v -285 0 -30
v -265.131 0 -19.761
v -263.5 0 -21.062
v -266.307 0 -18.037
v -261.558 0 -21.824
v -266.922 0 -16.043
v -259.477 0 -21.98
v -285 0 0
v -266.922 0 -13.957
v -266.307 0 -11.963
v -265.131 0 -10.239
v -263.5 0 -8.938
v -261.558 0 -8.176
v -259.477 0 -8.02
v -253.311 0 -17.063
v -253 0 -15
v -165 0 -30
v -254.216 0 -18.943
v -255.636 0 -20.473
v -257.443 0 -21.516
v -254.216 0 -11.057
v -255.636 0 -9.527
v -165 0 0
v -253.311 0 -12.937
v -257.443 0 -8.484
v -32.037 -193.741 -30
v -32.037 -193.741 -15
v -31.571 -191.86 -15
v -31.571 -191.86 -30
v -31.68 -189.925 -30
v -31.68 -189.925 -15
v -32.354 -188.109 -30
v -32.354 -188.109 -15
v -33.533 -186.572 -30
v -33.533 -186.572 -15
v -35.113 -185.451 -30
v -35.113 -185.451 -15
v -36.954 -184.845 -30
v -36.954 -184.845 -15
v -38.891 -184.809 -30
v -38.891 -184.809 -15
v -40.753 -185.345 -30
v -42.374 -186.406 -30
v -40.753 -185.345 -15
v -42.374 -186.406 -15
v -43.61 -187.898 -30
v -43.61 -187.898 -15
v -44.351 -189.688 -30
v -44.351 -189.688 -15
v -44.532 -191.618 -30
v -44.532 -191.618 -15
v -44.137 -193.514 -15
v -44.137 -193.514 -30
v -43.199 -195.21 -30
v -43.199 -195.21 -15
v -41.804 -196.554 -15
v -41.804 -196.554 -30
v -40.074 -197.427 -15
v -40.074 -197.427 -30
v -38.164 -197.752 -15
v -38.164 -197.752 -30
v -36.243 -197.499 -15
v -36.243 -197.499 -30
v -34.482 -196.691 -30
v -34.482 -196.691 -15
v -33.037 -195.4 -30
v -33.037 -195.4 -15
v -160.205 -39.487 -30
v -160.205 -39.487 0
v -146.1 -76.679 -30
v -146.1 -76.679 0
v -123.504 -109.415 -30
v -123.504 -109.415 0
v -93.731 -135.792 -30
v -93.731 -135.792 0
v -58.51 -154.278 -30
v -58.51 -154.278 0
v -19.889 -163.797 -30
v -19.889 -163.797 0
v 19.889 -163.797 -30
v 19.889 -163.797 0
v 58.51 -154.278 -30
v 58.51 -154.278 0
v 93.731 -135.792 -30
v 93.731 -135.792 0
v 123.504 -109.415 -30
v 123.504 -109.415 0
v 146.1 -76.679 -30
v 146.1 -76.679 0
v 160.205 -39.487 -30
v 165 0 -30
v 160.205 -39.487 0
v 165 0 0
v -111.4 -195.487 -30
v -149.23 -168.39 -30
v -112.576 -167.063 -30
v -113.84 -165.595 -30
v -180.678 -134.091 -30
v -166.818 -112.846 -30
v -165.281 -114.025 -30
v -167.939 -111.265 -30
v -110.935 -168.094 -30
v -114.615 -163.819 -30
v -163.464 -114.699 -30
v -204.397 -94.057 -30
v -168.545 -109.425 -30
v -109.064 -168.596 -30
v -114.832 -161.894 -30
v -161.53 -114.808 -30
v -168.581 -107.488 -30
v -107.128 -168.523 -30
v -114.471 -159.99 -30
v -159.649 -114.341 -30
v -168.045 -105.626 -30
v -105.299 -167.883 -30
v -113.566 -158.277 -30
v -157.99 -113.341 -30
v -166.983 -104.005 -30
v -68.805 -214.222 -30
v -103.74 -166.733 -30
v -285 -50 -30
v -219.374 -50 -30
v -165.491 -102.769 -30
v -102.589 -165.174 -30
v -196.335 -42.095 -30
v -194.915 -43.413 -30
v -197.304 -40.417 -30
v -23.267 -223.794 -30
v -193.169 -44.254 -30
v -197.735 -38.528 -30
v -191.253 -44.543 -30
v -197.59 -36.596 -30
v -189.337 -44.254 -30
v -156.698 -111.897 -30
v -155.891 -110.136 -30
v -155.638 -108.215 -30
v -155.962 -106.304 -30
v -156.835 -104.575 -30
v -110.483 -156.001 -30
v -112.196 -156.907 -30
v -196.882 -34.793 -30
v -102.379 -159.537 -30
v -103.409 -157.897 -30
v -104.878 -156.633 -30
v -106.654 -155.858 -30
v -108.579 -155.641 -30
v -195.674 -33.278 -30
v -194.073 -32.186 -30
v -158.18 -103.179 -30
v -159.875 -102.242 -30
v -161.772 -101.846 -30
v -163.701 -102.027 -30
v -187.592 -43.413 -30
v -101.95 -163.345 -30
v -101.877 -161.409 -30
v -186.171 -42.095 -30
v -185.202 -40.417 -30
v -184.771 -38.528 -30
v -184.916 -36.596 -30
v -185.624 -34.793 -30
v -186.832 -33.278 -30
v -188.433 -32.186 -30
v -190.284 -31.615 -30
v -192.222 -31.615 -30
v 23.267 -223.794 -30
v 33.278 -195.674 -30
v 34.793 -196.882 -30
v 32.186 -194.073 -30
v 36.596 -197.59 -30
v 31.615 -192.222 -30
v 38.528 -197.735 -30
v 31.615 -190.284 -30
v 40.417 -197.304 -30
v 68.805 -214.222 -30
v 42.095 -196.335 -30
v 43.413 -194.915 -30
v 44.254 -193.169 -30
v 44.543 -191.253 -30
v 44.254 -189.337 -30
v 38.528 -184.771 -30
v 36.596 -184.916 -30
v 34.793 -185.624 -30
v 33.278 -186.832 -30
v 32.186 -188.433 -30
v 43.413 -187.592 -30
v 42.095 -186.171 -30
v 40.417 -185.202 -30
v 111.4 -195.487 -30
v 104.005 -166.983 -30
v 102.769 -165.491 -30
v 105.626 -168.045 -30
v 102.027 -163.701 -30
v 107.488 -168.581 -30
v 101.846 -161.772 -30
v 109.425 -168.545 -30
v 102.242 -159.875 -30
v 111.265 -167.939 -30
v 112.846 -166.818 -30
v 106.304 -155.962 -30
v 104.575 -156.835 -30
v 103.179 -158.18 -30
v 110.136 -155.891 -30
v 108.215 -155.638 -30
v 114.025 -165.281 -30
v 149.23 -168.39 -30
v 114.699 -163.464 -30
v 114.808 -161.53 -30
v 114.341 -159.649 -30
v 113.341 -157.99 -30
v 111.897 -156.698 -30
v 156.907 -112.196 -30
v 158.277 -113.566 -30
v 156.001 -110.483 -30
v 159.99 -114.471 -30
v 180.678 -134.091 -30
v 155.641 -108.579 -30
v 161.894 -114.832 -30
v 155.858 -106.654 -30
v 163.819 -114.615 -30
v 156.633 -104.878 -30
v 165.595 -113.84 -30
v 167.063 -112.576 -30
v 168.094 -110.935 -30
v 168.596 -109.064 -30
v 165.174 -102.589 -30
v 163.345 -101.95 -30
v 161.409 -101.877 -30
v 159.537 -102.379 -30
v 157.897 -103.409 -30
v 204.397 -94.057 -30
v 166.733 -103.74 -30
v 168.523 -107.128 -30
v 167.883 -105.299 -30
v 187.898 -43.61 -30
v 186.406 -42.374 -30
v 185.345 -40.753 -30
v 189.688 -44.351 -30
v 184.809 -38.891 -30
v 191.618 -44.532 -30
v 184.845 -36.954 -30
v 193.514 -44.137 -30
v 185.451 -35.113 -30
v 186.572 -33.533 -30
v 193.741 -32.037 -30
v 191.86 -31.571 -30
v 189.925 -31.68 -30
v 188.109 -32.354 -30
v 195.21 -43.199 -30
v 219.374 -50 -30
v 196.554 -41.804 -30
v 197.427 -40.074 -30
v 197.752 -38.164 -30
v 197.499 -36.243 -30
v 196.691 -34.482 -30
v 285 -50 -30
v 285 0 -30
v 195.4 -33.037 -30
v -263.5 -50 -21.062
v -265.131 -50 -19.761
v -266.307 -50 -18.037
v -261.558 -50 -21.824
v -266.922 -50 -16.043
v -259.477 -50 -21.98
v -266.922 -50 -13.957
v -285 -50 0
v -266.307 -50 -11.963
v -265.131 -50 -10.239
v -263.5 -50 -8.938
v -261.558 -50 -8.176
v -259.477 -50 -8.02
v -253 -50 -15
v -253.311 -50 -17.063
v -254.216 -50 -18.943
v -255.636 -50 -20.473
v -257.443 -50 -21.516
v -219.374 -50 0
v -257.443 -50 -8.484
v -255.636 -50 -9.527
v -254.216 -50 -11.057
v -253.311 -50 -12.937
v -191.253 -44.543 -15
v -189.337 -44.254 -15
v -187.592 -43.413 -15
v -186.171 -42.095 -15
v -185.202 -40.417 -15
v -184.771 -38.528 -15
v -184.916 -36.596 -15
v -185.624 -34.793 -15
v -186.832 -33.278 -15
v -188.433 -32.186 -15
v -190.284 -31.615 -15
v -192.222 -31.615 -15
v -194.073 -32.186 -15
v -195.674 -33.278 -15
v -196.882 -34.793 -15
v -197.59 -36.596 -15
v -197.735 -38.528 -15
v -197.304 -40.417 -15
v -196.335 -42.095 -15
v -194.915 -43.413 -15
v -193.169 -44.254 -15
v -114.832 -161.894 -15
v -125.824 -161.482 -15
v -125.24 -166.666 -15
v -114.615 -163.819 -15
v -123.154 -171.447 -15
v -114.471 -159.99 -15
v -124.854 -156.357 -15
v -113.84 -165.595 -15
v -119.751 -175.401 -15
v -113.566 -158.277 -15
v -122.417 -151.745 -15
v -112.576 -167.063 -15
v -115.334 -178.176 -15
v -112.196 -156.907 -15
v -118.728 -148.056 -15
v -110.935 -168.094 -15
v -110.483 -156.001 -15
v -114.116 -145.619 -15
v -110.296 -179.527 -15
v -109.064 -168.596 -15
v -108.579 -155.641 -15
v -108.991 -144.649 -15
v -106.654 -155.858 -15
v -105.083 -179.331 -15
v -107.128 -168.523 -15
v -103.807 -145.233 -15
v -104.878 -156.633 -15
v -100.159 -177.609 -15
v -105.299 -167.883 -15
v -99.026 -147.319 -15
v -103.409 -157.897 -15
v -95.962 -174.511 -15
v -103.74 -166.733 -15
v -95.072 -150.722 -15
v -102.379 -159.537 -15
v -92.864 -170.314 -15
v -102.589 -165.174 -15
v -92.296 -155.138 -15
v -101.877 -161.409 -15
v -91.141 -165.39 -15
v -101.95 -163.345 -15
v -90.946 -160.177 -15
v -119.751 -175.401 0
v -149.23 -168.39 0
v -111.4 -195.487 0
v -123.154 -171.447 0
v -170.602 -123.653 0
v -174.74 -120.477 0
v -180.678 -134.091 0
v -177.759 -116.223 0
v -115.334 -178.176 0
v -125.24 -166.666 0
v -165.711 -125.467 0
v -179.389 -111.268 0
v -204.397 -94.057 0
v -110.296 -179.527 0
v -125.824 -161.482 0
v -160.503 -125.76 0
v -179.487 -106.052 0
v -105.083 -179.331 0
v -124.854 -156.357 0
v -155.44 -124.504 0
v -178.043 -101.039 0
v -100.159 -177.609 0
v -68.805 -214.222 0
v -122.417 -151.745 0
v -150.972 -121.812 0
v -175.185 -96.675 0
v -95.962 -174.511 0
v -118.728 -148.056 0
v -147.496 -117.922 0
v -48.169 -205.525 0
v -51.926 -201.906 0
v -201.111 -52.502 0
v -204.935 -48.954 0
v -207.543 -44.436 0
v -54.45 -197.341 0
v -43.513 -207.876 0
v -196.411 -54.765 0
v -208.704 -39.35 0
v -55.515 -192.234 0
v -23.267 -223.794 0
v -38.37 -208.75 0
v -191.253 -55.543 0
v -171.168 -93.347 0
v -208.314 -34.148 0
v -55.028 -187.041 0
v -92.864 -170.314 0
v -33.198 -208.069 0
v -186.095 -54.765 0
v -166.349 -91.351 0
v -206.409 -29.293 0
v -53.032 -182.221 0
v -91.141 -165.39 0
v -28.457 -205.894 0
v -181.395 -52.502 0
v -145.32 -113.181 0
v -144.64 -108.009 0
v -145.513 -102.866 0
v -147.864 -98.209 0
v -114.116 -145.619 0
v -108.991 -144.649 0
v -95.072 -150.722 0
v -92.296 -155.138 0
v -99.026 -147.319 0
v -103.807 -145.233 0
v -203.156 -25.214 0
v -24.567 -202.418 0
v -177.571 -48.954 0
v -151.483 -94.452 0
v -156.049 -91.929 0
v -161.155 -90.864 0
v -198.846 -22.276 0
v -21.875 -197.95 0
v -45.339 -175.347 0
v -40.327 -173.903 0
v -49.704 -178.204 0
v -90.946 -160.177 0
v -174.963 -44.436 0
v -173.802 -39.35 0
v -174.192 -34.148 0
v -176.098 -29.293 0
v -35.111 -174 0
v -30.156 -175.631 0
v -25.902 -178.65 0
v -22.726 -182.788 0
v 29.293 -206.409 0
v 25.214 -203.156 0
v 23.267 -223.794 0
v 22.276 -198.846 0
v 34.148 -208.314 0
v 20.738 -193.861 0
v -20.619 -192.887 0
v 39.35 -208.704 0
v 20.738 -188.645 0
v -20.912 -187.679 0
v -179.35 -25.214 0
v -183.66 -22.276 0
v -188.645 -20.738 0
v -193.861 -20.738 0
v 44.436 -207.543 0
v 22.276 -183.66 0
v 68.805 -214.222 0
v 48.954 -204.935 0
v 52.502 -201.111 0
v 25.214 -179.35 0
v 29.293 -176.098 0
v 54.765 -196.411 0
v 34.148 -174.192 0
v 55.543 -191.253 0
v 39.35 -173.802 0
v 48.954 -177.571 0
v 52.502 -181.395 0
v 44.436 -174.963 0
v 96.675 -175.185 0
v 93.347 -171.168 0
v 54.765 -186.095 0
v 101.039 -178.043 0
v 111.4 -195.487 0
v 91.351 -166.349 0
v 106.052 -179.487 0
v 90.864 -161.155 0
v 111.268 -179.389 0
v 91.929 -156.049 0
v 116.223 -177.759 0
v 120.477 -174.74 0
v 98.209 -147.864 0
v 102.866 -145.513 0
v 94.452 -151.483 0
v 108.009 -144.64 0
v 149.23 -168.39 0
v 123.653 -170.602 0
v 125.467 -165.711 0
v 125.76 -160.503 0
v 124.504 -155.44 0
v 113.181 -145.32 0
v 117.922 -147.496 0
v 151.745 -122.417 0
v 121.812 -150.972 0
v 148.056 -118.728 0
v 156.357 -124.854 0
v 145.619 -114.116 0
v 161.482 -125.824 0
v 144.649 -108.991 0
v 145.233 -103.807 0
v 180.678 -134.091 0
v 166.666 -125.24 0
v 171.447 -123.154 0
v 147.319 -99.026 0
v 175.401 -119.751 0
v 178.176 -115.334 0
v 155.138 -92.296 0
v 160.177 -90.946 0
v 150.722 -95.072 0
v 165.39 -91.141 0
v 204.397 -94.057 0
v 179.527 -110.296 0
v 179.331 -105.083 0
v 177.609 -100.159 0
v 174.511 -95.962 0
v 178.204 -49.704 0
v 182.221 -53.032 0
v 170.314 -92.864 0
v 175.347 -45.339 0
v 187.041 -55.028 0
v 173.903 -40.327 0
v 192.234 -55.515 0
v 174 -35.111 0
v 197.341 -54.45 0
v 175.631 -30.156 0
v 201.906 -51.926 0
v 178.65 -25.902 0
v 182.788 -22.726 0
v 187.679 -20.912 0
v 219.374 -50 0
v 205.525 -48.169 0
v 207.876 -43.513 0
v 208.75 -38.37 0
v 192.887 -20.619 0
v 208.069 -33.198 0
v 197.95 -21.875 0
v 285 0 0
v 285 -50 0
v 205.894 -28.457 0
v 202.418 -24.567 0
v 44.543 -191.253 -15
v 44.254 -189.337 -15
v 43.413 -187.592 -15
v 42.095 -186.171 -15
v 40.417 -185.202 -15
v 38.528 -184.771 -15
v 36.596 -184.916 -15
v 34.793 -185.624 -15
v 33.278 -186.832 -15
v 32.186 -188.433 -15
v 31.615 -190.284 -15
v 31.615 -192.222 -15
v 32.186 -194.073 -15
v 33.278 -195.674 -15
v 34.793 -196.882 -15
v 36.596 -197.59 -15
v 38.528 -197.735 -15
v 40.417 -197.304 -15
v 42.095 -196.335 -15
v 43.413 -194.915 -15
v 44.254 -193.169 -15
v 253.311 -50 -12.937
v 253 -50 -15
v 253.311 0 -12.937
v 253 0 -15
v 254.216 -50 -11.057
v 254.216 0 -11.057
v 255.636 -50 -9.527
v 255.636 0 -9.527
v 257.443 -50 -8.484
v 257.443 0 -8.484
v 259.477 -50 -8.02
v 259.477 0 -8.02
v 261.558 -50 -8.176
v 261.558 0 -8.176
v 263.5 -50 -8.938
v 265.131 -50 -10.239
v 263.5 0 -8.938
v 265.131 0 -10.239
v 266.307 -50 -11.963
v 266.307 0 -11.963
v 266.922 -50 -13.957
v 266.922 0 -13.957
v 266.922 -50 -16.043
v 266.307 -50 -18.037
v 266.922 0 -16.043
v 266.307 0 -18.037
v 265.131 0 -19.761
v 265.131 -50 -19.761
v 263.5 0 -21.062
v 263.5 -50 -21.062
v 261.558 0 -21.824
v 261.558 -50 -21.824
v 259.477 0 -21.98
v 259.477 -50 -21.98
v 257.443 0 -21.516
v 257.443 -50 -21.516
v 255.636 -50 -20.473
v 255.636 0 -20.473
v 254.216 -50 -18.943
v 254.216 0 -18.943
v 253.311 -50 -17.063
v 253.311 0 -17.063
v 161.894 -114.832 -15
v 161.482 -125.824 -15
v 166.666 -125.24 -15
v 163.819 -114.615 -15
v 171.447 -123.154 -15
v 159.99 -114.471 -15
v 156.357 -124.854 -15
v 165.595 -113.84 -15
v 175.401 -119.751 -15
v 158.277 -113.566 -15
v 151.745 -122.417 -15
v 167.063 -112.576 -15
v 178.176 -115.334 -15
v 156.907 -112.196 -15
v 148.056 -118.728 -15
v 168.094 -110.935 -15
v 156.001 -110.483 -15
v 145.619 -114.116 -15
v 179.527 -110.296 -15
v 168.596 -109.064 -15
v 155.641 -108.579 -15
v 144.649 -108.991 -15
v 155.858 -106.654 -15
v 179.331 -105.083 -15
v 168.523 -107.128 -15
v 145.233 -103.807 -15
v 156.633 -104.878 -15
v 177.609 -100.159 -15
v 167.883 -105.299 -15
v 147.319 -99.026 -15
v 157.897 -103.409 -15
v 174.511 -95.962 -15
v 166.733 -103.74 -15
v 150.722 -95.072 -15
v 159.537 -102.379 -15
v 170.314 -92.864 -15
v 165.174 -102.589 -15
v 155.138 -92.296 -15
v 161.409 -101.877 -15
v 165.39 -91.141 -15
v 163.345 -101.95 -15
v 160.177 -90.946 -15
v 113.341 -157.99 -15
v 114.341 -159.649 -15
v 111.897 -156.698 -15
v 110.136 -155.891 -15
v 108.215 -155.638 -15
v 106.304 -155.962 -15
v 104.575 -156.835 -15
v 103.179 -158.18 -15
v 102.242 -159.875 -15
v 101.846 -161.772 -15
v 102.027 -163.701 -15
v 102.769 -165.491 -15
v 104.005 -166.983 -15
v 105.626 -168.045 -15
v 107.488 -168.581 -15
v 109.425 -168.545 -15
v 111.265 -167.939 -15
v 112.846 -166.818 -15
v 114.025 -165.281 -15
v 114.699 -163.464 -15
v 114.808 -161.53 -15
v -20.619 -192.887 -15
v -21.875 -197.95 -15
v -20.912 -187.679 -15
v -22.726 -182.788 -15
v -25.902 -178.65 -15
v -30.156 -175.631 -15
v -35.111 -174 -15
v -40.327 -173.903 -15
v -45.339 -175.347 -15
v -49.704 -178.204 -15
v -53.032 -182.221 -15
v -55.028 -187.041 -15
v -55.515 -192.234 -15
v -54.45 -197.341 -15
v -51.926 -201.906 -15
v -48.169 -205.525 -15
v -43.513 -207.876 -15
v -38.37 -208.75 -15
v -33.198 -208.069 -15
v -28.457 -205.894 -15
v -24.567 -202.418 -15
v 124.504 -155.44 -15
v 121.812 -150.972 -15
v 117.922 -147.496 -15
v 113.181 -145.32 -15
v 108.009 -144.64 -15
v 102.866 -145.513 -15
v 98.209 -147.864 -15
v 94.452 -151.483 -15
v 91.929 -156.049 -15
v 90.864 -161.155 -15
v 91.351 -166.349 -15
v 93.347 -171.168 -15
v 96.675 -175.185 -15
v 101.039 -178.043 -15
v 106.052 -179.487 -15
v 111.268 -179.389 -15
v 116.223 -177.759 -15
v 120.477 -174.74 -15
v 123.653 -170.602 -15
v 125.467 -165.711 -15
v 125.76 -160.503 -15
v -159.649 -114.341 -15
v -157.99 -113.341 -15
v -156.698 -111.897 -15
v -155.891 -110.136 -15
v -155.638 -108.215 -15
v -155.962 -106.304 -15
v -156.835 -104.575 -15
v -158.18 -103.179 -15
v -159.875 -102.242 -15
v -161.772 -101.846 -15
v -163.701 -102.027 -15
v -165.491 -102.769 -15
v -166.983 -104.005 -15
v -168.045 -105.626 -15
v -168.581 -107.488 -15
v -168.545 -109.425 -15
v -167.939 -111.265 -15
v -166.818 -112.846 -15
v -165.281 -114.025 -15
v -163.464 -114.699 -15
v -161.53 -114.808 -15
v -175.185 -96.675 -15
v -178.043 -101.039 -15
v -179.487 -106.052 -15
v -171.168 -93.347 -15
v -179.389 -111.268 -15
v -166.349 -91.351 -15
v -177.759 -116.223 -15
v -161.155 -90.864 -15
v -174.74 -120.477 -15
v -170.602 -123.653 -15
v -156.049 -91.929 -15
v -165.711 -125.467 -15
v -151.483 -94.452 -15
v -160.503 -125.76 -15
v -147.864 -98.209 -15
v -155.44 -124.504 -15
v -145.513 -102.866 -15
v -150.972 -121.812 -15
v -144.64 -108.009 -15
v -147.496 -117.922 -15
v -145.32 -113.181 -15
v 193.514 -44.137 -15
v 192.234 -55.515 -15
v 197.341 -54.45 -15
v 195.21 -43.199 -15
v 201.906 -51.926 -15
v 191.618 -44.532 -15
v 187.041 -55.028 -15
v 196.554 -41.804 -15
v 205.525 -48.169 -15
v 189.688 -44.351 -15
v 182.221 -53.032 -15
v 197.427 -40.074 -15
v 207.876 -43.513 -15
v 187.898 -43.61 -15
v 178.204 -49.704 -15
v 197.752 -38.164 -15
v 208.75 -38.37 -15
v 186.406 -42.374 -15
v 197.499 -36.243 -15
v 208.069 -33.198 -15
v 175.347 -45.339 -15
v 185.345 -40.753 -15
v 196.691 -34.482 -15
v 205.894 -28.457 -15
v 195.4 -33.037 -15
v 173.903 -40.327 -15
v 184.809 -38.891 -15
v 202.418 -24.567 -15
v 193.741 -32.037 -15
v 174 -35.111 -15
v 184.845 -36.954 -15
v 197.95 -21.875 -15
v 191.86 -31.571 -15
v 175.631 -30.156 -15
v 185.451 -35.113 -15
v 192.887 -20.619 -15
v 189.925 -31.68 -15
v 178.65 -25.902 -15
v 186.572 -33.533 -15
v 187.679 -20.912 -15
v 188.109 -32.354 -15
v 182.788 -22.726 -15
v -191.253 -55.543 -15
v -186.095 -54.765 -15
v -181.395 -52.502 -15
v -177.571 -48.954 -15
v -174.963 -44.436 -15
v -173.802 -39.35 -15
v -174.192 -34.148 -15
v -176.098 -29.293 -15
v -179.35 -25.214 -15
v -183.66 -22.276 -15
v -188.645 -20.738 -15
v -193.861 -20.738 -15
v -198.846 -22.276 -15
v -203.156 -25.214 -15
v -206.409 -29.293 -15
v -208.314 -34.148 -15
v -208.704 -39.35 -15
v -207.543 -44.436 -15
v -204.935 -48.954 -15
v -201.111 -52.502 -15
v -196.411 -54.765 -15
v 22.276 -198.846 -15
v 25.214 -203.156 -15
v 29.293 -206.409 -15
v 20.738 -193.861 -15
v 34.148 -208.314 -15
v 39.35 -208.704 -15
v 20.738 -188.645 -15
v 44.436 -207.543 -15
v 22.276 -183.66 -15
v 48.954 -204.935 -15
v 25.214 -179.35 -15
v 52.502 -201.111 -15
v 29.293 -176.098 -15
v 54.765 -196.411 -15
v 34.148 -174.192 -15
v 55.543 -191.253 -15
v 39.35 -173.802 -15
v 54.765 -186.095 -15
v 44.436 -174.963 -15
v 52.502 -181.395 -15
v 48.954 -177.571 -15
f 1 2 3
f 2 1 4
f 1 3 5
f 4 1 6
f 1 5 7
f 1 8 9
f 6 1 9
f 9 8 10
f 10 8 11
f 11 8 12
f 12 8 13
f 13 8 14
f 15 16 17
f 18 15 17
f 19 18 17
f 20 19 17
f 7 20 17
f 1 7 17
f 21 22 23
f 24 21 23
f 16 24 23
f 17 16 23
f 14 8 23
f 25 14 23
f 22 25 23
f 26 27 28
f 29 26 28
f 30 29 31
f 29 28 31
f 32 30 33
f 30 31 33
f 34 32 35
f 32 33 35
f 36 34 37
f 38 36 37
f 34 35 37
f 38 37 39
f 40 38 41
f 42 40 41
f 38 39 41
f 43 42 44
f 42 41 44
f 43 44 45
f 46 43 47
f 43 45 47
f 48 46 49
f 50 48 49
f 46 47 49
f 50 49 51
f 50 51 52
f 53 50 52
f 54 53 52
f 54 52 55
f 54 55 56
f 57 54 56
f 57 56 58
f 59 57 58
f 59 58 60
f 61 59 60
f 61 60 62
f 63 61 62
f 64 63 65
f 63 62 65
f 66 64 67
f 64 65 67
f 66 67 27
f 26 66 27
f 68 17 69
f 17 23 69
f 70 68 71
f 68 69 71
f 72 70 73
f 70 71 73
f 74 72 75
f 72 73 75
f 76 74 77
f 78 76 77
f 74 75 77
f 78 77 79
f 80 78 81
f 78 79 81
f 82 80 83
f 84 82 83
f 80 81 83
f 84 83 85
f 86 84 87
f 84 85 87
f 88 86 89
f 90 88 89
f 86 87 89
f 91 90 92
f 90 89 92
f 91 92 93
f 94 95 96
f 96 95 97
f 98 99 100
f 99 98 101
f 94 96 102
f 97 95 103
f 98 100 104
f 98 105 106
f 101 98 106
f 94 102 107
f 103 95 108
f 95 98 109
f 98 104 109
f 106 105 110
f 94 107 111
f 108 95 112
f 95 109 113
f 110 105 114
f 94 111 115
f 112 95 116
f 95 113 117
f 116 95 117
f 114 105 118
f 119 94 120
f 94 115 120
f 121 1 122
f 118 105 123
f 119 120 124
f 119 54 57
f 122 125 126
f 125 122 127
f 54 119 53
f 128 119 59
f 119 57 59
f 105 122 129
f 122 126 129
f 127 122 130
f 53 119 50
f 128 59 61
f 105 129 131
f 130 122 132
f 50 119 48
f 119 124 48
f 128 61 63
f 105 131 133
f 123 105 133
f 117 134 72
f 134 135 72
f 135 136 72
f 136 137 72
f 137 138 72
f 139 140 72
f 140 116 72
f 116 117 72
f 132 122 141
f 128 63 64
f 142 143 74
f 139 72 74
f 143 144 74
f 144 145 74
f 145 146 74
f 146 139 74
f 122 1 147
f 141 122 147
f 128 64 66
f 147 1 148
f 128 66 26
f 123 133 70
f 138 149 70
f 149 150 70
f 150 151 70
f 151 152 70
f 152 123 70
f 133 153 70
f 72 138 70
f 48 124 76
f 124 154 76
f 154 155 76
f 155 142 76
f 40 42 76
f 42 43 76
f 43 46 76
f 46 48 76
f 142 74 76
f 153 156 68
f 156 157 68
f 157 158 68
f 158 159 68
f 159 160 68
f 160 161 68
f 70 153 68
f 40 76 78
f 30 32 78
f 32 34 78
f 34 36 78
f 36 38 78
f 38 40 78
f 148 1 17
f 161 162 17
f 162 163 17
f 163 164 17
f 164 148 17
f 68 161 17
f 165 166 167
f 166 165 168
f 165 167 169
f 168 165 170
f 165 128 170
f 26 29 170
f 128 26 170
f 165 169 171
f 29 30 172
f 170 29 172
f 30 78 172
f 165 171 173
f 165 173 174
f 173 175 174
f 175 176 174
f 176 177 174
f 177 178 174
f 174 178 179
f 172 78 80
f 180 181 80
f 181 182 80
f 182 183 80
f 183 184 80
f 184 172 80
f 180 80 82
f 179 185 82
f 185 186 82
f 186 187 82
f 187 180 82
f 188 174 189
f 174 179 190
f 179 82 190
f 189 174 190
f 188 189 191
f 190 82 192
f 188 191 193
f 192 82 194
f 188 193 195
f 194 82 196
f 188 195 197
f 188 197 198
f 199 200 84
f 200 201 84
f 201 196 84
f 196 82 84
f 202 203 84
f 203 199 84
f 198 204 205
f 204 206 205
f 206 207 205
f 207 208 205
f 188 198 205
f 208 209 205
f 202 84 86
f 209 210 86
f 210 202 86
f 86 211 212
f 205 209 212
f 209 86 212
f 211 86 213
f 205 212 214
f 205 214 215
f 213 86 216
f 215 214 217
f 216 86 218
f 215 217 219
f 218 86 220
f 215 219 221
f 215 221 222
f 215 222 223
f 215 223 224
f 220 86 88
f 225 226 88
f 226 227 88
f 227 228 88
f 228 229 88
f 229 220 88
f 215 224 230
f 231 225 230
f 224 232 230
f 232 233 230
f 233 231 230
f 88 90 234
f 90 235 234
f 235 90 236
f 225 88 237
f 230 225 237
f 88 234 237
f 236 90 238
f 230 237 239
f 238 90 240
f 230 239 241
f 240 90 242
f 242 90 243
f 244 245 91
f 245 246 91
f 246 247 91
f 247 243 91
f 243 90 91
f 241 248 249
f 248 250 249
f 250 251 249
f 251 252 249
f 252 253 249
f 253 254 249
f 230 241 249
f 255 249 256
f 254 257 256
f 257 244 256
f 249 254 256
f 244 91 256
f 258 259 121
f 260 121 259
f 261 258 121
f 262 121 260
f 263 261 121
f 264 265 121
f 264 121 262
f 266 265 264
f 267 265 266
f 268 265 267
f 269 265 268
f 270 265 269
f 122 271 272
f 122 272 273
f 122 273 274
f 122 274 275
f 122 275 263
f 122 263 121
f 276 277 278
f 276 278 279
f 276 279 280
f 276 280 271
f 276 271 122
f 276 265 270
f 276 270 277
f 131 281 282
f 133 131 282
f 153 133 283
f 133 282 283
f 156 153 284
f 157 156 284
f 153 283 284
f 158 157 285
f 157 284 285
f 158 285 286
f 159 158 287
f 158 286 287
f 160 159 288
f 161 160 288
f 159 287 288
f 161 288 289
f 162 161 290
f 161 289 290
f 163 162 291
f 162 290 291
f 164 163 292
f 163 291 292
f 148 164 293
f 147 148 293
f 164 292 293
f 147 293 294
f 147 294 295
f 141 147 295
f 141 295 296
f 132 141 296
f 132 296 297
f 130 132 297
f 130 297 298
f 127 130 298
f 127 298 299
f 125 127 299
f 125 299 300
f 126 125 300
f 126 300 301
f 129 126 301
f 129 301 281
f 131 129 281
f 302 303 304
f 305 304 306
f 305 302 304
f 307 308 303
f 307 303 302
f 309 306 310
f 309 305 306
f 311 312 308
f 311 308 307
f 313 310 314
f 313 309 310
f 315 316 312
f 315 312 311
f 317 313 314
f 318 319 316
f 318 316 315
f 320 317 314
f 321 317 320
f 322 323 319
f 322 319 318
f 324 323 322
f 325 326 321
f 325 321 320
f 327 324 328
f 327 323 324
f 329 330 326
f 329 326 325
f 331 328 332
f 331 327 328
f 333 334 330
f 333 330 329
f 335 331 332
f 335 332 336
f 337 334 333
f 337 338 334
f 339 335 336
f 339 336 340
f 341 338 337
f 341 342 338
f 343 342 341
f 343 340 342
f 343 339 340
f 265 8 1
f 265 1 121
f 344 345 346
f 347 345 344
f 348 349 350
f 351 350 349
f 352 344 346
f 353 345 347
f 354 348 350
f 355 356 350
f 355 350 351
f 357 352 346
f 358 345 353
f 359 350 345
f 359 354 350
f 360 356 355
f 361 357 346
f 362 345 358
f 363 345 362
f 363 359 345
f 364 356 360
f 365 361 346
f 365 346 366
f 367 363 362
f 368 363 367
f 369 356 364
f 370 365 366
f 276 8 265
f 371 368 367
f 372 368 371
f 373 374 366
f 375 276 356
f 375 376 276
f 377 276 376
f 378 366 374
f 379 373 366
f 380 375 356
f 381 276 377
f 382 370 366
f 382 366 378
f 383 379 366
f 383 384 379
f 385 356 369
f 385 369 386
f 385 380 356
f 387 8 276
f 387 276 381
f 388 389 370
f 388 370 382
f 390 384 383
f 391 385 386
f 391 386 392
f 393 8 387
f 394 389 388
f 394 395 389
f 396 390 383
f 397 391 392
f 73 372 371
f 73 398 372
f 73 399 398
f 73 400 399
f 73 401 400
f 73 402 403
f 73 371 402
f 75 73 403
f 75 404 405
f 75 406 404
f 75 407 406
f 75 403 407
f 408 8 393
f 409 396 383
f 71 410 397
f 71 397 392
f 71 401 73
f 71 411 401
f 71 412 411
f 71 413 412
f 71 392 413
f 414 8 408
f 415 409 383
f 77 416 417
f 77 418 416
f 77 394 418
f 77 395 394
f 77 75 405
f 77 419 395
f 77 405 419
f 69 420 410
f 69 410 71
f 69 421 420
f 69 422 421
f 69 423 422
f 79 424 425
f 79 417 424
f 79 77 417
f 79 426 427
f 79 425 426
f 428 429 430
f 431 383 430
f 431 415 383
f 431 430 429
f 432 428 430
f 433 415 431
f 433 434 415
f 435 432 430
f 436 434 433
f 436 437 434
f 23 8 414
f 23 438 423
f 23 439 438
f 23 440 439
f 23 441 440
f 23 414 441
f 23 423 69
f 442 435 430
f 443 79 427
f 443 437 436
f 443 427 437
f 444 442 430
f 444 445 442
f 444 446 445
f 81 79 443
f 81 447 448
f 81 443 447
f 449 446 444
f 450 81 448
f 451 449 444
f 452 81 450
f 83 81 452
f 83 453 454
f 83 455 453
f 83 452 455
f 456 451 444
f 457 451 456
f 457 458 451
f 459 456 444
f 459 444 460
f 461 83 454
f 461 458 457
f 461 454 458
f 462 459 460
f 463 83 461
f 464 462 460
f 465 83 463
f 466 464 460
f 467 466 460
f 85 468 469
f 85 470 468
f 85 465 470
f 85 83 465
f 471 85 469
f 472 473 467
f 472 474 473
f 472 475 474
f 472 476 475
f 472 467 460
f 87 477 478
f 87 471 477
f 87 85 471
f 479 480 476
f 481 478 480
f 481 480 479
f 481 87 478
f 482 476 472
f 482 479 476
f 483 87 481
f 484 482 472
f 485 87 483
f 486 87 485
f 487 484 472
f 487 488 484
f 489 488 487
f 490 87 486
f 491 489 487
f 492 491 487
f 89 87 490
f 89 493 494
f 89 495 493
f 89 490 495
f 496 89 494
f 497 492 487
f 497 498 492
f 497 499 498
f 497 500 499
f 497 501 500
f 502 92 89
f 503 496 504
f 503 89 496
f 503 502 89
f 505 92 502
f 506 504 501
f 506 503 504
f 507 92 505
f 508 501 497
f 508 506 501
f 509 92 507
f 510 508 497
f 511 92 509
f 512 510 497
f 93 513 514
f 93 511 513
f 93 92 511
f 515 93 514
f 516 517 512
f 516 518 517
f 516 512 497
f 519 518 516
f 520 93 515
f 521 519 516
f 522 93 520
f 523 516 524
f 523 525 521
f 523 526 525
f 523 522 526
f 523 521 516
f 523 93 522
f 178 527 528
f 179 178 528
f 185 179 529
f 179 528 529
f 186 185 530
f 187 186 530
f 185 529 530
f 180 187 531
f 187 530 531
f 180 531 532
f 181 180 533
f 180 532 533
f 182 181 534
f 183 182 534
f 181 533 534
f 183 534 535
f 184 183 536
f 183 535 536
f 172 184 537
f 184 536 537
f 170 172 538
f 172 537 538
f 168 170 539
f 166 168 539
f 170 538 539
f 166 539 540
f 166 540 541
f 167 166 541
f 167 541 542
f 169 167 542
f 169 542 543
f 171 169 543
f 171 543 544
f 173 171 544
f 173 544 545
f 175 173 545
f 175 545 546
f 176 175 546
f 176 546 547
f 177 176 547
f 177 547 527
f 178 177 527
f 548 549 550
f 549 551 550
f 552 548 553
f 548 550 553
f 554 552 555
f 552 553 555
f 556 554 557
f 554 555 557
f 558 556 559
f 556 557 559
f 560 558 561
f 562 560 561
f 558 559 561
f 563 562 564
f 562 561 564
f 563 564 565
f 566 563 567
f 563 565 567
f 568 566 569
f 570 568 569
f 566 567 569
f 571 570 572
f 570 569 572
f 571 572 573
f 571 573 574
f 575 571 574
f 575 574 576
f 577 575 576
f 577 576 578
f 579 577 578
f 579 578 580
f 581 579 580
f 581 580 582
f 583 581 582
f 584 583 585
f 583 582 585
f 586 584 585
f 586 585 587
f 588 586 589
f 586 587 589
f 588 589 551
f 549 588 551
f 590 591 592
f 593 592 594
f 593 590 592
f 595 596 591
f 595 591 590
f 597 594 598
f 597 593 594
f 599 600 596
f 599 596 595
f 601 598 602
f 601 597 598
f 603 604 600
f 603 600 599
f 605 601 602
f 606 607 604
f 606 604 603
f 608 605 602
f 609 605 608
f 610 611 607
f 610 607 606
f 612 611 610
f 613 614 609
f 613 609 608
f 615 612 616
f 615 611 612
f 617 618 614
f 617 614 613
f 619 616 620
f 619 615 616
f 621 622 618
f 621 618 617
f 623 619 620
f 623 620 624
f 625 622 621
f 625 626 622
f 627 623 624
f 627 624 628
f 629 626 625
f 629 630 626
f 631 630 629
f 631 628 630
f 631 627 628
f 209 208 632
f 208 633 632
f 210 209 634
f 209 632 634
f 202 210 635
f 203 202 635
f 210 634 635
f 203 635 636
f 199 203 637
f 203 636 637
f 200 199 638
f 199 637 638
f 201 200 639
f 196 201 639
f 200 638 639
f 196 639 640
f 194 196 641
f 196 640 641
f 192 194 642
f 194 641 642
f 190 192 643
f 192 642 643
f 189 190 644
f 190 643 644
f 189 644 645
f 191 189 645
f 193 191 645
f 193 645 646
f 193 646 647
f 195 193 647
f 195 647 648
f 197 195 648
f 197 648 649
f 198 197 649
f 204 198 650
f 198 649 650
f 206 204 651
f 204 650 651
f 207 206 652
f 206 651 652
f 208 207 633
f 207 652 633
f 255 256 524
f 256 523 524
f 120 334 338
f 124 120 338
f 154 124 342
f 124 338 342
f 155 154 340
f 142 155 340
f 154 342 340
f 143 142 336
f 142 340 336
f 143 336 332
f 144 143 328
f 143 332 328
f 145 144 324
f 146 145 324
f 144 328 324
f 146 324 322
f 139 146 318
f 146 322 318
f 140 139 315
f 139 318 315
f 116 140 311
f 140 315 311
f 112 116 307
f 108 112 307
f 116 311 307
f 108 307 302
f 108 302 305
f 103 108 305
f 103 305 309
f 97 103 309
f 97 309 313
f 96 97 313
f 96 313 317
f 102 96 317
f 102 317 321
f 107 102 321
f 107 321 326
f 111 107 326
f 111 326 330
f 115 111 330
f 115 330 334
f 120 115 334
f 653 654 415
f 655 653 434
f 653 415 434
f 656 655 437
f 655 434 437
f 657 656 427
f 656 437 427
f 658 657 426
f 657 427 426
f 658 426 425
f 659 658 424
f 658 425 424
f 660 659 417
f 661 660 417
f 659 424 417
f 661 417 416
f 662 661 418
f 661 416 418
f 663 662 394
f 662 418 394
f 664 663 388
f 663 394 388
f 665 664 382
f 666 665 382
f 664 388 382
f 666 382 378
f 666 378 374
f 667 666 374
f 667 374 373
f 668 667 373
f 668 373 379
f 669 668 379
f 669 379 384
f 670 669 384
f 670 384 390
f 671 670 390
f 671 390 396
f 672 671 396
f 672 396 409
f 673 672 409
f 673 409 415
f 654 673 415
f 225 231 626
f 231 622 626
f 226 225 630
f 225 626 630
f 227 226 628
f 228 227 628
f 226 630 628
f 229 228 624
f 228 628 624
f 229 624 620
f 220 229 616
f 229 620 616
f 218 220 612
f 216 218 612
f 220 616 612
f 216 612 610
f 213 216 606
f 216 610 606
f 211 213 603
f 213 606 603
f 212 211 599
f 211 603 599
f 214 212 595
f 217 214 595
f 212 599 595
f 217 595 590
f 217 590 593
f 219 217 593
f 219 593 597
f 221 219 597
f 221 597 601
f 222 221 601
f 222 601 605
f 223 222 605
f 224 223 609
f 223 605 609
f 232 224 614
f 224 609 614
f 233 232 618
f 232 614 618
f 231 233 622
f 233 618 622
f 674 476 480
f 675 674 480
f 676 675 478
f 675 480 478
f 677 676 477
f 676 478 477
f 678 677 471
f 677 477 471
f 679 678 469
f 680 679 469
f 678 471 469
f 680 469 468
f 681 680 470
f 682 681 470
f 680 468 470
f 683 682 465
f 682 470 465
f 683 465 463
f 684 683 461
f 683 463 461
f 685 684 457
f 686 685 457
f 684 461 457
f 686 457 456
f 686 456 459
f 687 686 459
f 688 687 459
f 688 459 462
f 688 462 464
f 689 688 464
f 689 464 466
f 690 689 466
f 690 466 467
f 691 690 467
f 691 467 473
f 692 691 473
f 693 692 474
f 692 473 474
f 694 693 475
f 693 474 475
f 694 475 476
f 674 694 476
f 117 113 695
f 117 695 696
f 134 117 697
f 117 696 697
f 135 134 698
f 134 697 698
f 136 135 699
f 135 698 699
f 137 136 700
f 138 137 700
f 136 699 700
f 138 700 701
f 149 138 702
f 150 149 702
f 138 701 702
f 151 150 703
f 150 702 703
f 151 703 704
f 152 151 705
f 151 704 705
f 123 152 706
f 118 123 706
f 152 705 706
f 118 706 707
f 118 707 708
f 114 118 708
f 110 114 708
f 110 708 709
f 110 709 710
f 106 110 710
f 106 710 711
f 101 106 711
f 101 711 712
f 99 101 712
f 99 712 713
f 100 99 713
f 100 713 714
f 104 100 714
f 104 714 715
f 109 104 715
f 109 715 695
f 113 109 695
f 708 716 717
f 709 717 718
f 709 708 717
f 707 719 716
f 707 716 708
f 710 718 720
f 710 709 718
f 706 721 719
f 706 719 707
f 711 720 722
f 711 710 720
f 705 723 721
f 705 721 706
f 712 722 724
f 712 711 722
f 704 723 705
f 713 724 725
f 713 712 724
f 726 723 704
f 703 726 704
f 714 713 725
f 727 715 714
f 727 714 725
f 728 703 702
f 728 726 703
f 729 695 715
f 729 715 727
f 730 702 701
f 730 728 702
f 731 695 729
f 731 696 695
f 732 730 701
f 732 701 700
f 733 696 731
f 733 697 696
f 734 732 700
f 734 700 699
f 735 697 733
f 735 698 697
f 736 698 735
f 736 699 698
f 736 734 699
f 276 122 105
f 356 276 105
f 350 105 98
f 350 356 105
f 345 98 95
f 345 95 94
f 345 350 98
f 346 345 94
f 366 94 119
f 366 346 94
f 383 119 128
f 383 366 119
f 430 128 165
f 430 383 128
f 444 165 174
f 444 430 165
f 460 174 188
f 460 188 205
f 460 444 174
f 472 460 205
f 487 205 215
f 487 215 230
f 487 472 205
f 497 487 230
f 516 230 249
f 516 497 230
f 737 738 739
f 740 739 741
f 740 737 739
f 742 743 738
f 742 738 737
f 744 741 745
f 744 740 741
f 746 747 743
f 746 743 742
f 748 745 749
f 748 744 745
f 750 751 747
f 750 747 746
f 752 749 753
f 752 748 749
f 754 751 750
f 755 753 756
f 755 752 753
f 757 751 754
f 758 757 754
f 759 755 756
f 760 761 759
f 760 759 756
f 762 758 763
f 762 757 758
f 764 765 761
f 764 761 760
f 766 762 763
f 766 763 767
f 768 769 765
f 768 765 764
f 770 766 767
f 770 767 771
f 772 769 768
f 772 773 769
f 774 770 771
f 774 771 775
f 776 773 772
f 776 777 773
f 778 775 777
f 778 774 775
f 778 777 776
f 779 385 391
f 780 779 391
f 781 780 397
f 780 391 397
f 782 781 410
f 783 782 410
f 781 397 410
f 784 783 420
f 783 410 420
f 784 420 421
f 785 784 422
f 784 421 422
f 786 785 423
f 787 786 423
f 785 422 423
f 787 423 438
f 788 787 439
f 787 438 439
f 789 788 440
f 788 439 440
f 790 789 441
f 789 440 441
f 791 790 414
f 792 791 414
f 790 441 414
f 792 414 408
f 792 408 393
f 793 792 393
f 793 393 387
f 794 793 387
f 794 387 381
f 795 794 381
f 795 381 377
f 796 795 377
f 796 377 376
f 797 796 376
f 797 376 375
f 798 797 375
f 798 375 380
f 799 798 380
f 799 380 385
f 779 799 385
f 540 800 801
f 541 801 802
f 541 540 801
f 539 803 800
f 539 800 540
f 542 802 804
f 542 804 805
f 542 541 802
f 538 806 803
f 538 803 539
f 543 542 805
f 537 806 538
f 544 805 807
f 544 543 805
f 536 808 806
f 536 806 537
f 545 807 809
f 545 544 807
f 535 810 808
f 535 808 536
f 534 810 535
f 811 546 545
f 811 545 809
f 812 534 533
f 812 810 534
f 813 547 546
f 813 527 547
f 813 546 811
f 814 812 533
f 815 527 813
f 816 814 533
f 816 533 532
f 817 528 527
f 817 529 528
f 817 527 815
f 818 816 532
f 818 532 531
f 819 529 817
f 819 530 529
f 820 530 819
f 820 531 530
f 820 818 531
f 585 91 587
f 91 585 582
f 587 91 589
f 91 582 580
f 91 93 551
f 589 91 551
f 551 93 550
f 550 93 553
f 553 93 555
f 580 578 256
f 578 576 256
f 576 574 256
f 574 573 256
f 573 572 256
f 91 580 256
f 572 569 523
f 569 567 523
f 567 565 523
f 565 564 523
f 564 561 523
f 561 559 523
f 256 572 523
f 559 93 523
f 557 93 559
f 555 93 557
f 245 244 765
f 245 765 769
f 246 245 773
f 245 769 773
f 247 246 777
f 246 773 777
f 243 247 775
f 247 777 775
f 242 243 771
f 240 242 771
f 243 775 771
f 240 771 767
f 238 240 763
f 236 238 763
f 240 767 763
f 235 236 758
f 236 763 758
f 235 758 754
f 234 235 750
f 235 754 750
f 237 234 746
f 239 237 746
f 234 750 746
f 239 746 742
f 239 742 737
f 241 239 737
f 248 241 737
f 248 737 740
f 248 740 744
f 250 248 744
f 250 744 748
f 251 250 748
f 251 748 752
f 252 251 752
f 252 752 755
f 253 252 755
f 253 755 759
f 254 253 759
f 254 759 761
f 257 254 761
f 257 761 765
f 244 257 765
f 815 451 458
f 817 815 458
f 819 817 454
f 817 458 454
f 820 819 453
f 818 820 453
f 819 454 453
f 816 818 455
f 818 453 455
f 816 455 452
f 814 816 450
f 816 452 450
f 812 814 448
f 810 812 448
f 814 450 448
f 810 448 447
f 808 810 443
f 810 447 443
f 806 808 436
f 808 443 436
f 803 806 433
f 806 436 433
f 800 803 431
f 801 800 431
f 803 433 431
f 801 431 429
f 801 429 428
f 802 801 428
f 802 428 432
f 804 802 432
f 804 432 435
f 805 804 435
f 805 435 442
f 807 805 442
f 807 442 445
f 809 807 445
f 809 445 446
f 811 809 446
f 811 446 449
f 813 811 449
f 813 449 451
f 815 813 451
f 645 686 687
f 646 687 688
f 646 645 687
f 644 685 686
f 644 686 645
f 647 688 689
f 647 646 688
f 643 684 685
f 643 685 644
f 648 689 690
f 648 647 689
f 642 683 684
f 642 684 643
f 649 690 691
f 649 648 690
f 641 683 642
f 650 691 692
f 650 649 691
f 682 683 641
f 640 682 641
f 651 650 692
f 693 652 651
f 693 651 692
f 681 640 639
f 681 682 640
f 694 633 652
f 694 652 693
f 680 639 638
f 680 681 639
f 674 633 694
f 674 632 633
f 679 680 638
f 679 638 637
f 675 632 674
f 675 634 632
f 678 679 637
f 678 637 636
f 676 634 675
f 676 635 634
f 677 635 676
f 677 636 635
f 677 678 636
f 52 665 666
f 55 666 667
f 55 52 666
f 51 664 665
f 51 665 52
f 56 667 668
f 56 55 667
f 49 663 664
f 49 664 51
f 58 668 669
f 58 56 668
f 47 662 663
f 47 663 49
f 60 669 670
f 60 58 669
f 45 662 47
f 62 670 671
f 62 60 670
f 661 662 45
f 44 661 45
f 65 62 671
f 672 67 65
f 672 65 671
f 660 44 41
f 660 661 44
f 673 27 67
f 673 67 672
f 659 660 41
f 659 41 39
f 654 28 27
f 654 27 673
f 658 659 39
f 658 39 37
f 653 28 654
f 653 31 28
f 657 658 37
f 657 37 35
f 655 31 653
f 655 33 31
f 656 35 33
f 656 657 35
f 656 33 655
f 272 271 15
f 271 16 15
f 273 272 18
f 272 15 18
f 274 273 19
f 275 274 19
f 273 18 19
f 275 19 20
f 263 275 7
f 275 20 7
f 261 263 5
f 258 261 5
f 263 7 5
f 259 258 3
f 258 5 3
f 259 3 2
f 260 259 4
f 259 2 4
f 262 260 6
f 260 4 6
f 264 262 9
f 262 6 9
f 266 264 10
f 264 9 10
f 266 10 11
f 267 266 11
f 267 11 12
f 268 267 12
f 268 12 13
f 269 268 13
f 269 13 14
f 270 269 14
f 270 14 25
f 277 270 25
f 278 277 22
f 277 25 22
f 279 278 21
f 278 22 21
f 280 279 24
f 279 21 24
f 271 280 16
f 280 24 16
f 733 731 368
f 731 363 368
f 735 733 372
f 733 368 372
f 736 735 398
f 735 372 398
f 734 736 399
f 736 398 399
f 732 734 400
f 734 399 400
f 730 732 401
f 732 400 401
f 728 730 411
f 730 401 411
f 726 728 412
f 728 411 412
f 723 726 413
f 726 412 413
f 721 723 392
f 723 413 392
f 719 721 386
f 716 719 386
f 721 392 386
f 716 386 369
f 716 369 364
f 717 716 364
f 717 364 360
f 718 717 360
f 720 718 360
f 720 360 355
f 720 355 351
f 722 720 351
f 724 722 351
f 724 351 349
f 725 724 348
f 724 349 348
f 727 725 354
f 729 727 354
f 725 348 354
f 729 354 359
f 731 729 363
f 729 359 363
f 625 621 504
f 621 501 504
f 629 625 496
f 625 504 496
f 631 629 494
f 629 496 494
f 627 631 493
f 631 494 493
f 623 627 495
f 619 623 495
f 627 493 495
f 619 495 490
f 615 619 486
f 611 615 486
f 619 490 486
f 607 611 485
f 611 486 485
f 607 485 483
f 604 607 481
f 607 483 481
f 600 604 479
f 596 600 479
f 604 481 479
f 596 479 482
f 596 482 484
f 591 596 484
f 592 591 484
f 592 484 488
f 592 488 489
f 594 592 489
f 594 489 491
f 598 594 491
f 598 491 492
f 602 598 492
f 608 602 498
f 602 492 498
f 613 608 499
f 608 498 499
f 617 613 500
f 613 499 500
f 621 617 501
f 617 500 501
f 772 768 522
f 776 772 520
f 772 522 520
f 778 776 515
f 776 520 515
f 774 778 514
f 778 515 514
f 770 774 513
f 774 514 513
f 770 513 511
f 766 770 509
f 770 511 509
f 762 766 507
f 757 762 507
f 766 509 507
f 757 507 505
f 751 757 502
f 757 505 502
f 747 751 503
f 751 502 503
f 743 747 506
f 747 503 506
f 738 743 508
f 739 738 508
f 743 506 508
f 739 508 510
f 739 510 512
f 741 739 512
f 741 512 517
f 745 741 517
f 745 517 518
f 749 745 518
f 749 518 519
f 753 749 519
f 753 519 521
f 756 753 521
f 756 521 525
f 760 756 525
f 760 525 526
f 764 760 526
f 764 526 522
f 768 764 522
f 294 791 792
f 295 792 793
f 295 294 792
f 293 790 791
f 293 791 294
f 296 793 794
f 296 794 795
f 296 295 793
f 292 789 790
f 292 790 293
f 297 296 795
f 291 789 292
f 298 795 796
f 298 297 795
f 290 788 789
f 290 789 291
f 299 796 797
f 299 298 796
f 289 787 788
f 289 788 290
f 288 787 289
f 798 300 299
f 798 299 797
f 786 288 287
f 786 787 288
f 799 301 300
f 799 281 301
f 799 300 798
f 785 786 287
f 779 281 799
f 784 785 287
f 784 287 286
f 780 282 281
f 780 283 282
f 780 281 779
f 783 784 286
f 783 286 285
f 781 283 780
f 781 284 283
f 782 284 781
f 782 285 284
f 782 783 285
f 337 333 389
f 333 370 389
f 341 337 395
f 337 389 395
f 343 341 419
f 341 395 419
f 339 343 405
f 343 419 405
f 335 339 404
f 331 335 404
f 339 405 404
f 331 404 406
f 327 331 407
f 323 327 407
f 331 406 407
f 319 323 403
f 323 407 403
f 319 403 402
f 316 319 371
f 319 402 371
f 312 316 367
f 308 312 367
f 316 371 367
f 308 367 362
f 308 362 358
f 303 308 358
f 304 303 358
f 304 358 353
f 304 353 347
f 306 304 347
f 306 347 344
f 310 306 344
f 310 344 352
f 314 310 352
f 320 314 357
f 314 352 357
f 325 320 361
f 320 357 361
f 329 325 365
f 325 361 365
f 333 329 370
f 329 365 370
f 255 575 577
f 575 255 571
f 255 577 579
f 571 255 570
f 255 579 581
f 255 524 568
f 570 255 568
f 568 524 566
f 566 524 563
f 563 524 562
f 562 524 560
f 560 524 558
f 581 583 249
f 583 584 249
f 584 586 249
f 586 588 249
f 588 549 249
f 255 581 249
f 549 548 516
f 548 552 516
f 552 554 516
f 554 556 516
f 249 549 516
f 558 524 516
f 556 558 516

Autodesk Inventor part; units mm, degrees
ref_plane "YZ Plane" through (0, 0, 0) normal (1, 0, 0) x (0, 1, 0)
ref_plane "XZ Plane" through (0, 0, 0) normal (0, 1, 0) x (-1, 0, 0)
ref_plane "XY Plane" through (0, 0, 0) normal (0, 0, 1) x (1, 0, 0)
sketch "Sketch1" plane through (0, 0, 0) normal (0, 0, 1) x (1, 0, 0)
  circle A0 centre (0, 0) radius 195 construction
  line L0 (0, 195) -> (0, 225) construction
  line L1 (0, 195) -> (0, 165) construction
  circle A1 centre (0, 0) radius 165
  circle A2 centre (0, 0) radius 225
  line L2 (-165, 0) -> (-165, 80)
  line L3 (-165, 80) -> (-225, 80)
  line L4 (-225, 80) -> (-225, 0)
  line L5 (165, 0) -> (165, 80)
  line L6 (165, 80) -> (225, 80)
  line L7 (225, 80) -> (225, 0)
  line L8 (-225, 0) -> (-165, 0)
  line L9 (165, 0) -> (225, 0)
  line L10 (-225, 0) -> (-285, 0)
  line L11 (-285, 0) -> (-285, -50)
  line L12 (-285, -50) -> (-219.3741, -50)
  line L13 (225, 0) -> (285, 0)
  line L14 (285, 0) -> (285, -50)
  line L15 (285, -50) -> (219.3741, -50)
  dimension "d13" = 390
  dimension "d26" = 80
  dimension "d36" = 60
  dimension "d40" = 60
  dimension "d41" = 50
extrude "Extrusion1" add sketch "Sketch1" against normal blind 30 contours L9 A2 L8 A1 | L13 L14 L15 A2 | A2 L12 L11 L10
sketch "Sketch4" plane through (0, 0, 0) normal (0, 0, 1) x (1, 0, 0)
  circle A0 centre (38.0426, -191.2531) radius 6.5
  line L0 (0, 0) -> (38.0426, -191.2531) construction
  line L1 (0, 0) -> (0, -276.8337) construction
  dimension "d17" = 13
  dimension "d27" = 195
  dimension "d35" = 11.25
extrude "Extrusion4" cut sketch "Sketch4" against normal through all
sketch "Sketch5" plane through (0, 0, 0) normal (0, 0, 1) x (1, 0, 0)
  circle A0 centre (38.0426, -191.2531) radius 6.5 projected
  circle A1 centre (38.0426, -191.2531) radius 17.5
  point P0 (0, 0)
  dimension "d23" = 35
extrude "Extrusion5" cut sketch "Sketch5" against normal blind 15
pattern_circular "Circular Pattern3" count 8 over 157.5 about axis through (0, 0, 0) along (0, 0, -1) of "Extrusion4", "Extrusion5" both ways yes
sketch "Sketch7" plane through (-285, 0, 0) normal (0, 1, 0) x (1, 0, 0)
  circle A0 centre (25, 15) radius 7
  line L0 (0, 0) -> (0, 30) projected
  point P0 (285, 0)
  point P1 (0, 15)
  dimension "d42" = 14
  dimension "d43" = 25
extrude "Extrusion7" cut sketch "Sketch7" against normal through all
mirror "Mirror1" about plane through (0, 0, 0) normal (1, 0, 0) of "Extrusion7"
equation "\"d13\" = Шпил_пласт_НОС_диам_центров"
equation "\"d40\" = d36"
equation "\"d27\" = 0.5 * Шпил_пласт_НОС_диам_центров"
equation "\"BendReliefDepth\" = 0.5 * Thickness"
equation "\"Шпил_пласт_НОС_диам_центров\" = 390"
equation "\"Thickness\" = 30"
properties part number "ДМФ 091 Постель НОС"
